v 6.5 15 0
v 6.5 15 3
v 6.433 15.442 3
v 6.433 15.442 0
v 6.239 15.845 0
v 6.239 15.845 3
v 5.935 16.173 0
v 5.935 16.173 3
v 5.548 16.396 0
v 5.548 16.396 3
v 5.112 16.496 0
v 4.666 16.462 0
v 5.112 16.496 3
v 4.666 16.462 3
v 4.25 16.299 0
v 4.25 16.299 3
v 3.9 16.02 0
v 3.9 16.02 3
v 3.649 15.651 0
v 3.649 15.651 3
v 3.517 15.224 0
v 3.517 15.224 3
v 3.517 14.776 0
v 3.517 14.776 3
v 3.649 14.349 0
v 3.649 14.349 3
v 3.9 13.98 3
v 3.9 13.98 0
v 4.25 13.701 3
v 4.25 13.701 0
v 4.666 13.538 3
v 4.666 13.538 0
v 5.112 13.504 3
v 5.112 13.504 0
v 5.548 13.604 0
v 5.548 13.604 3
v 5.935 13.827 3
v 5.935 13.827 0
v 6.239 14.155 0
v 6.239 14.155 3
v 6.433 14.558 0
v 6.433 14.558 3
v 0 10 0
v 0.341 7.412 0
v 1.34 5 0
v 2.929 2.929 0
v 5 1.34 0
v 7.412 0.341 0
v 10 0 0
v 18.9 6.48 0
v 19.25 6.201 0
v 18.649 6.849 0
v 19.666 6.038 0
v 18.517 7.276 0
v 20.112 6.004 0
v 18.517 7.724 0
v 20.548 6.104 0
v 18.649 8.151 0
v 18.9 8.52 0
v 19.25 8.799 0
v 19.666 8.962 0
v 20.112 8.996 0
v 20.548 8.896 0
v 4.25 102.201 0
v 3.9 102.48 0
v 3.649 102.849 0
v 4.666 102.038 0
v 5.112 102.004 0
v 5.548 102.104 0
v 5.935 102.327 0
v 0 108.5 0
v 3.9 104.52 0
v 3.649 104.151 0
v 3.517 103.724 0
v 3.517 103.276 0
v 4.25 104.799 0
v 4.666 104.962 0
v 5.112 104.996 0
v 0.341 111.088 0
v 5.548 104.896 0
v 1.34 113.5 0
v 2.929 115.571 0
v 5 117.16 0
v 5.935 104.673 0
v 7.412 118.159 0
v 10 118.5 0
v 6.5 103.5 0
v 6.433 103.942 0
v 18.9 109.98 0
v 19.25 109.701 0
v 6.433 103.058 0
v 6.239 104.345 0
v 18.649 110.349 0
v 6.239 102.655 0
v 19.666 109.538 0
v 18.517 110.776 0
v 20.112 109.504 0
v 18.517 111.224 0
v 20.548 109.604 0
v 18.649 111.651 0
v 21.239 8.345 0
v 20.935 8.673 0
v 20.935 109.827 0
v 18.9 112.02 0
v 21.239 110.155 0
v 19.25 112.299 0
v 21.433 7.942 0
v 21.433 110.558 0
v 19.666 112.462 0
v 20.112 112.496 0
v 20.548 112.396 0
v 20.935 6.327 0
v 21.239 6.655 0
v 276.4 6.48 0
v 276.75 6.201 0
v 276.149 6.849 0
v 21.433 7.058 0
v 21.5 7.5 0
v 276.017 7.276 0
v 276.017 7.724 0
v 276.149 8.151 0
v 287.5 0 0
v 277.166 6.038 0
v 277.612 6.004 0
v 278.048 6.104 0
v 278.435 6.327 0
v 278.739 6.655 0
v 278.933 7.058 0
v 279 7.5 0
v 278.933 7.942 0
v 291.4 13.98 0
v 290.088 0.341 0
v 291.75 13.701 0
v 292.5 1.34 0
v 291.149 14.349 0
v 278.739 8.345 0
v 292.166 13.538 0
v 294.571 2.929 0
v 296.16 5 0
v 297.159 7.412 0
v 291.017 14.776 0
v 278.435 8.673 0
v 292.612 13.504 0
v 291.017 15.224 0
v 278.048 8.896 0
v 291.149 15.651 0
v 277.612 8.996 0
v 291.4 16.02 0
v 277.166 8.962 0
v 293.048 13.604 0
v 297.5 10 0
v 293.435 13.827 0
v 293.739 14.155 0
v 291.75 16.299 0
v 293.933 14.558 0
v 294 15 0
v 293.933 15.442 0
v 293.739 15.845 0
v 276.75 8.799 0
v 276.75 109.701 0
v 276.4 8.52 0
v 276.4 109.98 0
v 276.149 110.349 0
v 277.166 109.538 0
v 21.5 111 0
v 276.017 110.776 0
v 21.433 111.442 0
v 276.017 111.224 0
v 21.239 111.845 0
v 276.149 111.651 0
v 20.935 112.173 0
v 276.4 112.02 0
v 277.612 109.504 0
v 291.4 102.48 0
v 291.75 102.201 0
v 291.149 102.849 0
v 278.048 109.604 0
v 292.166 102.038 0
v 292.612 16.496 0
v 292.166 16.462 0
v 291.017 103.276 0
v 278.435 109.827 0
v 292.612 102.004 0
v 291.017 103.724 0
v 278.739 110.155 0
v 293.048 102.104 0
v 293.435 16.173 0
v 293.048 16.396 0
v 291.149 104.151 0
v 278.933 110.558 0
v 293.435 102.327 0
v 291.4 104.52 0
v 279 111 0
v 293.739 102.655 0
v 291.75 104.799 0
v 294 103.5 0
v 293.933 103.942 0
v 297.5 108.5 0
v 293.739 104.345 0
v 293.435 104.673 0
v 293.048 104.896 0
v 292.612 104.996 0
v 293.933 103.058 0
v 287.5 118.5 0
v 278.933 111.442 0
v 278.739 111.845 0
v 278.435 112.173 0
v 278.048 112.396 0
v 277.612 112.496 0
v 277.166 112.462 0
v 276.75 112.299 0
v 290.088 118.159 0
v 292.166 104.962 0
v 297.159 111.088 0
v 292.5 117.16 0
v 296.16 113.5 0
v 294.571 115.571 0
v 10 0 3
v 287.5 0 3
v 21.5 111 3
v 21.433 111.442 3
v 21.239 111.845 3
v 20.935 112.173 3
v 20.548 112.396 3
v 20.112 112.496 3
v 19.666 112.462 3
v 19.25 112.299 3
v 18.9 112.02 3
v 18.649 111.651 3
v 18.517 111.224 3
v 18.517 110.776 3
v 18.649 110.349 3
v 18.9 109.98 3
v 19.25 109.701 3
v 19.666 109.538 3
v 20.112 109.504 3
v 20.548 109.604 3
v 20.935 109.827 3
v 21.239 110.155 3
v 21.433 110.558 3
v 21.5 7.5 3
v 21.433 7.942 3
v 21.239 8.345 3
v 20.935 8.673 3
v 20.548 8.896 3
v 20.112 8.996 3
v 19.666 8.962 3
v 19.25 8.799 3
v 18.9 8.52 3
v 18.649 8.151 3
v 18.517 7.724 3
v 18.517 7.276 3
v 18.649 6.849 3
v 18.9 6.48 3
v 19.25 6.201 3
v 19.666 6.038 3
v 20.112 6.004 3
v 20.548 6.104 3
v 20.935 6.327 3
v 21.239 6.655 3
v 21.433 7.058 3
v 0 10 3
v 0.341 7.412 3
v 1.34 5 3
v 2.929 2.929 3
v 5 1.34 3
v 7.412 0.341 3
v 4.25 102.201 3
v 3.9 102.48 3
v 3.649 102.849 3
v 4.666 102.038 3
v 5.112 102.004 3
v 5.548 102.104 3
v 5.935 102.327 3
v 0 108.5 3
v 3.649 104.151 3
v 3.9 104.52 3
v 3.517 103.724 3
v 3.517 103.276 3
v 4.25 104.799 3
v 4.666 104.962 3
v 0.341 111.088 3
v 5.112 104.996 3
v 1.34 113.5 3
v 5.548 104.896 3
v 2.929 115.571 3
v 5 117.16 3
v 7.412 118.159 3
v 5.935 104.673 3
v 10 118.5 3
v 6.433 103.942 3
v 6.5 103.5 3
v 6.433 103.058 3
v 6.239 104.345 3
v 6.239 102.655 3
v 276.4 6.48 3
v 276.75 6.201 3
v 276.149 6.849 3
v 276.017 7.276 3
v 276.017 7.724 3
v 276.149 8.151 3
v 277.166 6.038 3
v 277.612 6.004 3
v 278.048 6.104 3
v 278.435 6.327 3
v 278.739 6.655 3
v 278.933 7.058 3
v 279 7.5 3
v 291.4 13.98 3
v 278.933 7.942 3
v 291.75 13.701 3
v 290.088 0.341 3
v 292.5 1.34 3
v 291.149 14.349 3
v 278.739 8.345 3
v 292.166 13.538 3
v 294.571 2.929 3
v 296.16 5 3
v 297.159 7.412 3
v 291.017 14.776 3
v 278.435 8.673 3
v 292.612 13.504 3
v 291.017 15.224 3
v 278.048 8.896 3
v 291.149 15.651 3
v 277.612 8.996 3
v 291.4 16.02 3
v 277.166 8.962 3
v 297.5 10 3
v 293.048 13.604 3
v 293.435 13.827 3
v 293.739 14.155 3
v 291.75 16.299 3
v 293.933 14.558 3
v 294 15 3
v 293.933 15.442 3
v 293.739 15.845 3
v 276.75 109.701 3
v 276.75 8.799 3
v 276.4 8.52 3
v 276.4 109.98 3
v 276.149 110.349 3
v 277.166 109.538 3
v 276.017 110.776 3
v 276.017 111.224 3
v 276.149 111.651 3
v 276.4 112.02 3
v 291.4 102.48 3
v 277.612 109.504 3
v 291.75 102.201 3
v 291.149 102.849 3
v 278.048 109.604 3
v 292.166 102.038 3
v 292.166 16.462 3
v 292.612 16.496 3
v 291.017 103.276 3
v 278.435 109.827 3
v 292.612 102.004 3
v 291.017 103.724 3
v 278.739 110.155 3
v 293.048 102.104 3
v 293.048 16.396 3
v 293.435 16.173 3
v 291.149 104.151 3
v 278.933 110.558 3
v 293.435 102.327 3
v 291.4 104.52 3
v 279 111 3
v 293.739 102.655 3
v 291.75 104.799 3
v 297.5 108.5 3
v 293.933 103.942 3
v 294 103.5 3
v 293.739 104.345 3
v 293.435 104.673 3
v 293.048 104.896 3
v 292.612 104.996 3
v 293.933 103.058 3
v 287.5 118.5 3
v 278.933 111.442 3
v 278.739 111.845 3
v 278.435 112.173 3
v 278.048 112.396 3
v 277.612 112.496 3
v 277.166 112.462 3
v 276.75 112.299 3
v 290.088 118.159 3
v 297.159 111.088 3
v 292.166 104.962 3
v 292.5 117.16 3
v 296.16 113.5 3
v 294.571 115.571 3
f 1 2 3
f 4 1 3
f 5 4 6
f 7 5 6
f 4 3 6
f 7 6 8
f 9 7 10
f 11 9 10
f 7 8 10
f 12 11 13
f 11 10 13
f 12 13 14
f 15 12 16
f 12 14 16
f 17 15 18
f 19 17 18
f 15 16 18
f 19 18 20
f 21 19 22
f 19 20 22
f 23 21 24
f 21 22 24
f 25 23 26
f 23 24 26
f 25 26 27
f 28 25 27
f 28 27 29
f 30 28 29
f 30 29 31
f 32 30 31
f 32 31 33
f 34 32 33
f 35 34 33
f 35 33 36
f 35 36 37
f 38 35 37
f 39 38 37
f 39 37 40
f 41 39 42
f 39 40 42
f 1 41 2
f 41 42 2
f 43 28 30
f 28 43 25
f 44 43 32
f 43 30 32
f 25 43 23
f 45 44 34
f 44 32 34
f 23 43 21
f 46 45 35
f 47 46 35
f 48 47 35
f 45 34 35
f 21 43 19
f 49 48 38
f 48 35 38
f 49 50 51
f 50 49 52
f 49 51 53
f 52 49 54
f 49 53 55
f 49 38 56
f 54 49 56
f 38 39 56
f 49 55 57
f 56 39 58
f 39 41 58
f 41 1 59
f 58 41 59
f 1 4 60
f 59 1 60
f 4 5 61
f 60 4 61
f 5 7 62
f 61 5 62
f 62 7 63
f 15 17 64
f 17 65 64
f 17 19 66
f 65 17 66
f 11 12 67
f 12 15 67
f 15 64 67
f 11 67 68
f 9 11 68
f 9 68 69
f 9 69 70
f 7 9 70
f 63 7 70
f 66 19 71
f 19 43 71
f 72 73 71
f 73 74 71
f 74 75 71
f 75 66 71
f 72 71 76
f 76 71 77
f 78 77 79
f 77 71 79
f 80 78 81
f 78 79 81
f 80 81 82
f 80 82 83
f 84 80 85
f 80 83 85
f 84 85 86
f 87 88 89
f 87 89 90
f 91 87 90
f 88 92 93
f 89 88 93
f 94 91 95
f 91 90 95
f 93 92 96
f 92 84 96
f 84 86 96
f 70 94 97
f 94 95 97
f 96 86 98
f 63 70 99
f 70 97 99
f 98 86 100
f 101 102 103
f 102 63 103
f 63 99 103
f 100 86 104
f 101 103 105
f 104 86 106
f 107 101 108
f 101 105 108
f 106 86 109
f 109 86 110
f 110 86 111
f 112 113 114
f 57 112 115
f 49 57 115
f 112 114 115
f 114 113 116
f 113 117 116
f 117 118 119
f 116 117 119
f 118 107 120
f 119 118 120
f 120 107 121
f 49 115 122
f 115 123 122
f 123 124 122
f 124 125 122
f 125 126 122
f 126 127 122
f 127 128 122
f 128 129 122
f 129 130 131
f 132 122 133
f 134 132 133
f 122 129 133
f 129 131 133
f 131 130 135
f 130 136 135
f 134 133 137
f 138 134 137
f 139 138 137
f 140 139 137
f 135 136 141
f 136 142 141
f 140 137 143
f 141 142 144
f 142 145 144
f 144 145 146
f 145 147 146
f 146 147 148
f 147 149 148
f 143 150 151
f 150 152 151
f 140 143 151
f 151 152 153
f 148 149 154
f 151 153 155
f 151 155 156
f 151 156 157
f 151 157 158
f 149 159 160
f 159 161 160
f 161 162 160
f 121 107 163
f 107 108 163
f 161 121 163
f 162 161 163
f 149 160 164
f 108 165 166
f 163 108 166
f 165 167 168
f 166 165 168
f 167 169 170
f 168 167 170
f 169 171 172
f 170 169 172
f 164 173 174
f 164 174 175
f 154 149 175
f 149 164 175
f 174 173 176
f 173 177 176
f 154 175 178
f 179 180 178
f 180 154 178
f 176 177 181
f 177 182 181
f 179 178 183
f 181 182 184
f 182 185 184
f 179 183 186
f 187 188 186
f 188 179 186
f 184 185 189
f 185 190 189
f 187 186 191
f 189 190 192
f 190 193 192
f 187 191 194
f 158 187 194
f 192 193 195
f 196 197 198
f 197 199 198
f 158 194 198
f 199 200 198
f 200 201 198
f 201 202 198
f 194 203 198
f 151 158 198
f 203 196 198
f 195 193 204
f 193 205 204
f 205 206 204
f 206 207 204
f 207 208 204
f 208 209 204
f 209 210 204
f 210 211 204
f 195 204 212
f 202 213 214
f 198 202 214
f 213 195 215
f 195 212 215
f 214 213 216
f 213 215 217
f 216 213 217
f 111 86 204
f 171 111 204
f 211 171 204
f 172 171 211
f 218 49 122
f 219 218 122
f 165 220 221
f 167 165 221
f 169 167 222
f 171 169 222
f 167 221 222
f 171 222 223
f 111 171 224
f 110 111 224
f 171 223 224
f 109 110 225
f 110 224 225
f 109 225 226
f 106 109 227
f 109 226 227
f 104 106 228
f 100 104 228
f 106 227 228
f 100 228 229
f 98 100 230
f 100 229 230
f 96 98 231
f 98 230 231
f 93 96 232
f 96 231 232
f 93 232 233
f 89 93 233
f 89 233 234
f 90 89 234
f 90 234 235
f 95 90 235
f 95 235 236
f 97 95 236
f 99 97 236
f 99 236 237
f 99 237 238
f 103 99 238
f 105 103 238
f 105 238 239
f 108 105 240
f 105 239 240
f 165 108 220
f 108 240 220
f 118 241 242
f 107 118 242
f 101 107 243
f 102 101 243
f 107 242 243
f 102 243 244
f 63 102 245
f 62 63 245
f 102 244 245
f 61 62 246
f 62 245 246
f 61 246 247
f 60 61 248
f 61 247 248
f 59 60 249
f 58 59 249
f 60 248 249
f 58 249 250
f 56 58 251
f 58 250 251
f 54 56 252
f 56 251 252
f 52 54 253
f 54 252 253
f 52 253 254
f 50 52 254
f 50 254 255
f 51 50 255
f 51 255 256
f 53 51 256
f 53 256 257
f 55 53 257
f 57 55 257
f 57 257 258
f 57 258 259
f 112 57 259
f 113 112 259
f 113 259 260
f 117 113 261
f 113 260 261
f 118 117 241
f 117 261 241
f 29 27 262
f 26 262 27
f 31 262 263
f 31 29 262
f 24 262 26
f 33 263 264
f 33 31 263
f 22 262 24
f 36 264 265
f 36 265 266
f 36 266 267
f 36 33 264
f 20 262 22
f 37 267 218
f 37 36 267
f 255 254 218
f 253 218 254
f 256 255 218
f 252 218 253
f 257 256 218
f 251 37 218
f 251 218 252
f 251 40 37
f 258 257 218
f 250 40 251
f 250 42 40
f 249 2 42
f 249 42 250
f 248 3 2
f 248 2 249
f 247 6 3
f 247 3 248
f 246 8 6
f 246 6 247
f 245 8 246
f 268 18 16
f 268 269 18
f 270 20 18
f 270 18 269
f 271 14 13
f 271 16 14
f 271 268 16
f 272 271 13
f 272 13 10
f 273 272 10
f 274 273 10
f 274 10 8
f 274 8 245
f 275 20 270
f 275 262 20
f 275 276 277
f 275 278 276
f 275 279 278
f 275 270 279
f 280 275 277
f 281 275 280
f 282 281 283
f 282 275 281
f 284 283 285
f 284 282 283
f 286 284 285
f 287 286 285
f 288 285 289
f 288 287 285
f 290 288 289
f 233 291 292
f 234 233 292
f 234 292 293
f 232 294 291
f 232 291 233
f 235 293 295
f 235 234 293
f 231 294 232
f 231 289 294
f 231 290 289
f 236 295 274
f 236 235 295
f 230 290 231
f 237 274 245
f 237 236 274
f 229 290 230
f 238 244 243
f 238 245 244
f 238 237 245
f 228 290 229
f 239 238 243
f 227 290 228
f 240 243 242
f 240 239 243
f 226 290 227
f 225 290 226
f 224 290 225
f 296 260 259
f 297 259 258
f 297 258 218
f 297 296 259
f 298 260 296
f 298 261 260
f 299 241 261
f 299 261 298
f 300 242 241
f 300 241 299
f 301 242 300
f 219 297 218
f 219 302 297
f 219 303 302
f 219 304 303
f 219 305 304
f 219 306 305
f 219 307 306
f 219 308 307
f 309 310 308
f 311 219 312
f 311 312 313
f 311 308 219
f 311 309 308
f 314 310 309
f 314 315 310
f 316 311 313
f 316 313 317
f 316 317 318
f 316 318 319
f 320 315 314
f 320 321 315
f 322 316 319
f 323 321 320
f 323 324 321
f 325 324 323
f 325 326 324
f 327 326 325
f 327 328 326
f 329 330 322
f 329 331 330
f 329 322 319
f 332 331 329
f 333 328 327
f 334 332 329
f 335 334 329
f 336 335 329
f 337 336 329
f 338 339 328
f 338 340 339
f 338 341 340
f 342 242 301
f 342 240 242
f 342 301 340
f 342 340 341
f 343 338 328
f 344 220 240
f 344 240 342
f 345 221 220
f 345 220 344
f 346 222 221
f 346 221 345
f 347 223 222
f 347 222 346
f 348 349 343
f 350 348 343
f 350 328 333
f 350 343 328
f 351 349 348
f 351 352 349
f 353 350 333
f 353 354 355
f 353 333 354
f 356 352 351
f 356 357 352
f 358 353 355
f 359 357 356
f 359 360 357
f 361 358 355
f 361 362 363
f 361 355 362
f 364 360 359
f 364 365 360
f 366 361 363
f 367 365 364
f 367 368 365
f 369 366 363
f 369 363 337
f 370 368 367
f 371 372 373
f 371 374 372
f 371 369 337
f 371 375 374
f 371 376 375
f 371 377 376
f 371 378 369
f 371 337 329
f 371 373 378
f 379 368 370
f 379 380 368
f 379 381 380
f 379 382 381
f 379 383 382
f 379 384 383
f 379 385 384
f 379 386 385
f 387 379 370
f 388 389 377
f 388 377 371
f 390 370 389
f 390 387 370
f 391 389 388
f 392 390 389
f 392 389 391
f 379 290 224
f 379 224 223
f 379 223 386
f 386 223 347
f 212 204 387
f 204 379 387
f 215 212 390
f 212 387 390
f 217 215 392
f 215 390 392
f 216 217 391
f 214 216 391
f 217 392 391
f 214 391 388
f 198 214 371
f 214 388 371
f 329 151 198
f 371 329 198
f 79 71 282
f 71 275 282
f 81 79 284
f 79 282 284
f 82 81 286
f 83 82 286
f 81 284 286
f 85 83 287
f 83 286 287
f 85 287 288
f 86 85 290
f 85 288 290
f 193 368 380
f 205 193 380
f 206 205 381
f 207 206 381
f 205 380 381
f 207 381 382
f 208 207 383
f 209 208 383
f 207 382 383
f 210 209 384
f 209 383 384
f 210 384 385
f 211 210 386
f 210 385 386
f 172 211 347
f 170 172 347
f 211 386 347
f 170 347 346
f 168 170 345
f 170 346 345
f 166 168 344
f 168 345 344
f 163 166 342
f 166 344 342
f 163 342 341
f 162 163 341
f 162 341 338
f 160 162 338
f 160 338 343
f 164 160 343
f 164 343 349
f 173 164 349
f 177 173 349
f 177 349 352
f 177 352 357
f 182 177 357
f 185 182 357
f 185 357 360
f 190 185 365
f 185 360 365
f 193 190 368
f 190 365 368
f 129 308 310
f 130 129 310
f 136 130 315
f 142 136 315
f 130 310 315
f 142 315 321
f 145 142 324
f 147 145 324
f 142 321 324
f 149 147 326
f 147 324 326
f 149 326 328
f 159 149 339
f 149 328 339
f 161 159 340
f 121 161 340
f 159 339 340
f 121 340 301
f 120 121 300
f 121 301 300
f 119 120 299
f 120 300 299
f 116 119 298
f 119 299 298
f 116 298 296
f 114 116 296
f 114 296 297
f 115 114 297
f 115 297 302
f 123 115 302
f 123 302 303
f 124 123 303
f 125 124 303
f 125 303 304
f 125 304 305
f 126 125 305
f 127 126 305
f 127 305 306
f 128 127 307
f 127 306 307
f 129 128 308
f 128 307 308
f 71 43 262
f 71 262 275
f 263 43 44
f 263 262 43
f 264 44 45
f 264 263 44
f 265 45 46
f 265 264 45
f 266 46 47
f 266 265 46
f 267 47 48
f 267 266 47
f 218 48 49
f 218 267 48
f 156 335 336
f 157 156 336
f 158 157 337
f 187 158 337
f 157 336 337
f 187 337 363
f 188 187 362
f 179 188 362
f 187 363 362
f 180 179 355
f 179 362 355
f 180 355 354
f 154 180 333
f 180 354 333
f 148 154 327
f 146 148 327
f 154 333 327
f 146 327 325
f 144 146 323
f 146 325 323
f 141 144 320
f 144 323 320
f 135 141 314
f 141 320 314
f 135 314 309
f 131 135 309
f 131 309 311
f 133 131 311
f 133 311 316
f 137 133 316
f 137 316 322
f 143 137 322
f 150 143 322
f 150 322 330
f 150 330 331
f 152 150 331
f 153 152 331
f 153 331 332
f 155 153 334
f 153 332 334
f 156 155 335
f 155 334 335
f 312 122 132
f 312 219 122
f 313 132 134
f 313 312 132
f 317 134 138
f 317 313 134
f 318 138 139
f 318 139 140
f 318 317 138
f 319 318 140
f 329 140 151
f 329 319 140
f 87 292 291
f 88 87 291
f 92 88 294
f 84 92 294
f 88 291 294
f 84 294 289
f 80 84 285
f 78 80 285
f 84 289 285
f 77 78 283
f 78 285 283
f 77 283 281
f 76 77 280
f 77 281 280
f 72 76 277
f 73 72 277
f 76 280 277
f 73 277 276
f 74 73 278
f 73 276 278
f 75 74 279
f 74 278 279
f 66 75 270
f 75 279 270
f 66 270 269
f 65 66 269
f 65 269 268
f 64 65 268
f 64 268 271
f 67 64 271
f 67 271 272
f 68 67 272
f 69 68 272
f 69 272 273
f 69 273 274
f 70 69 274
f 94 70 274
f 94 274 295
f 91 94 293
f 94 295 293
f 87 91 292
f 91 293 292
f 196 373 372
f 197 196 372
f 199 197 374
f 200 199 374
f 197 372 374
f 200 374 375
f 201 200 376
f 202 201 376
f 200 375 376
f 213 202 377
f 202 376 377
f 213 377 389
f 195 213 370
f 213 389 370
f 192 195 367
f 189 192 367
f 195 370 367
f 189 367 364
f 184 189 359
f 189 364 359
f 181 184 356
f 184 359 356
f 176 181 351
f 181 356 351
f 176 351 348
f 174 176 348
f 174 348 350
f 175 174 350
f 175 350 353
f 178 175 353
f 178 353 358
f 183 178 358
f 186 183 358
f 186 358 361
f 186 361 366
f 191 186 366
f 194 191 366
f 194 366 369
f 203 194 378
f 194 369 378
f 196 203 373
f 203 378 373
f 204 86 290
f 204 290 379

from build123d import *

# Parameters (mm, degrees)
SKETCH1_W           = 297.5
SKETCH1_H           = 118.5
BOSS_EXTRUDE1_DEPTH = 3
SKETCH2_R           = 1.5
CUT_EXTRUDE1_DEPTH  = 3
FILLET1_R           = 10


with BuildPart() as part:
    # Sketch1 → Boss-Extrude1 (new body)
    with BuildSketch(Plane.XY):
        with Locations((148.75, 59.25)):
            Rectangle(SKETCH1_W, SKETCH1_H)
    extrude(amount=BOSS_EXTRUDE1_DEPTH)

    # Sketch2 → Cut-Extrude1 (cut)
    with BuildSketch(Plane.XY.offset(3)):
        with Locations((5, 15)):
            Circle(SKETCH2_R)
        with Locations((20, 7.5)):
            Circle(SKETCH2_R)
        with Locations((20, 111)):
            Circle(SKETCH2_R)
        with Locations((5, 103.5)):
            Circle(SKETCH2_R)
        with Locations((292.5, 15)):
            Circle(SKETCH2_R)
        with Locations((277.5, 7.5)):
            Circle(SKETCH2_R)
        with Locations((292.5, 103.5)):
            Circle(SKETCH2_R)
        with Locations((277.5, 111)):
            Circle(SKETCH2_R)
    extrude(amount=-CUT_EXTRUDE1_DEPTH, mode=Mode.SUBTRACT)

    # Fillet1
    fillet1_edges = [part.edges().sort_by_distance(p)[0] for p in [
        (0, 118.5, 1.5),
        (297.5, 118.5, 1.5),
        (297.5, 0, 1.5),
        (0, 0, 1.5),
    ]]
    fillet(fillet1_edges, radius=FILLET1_R)


solid = part.part
